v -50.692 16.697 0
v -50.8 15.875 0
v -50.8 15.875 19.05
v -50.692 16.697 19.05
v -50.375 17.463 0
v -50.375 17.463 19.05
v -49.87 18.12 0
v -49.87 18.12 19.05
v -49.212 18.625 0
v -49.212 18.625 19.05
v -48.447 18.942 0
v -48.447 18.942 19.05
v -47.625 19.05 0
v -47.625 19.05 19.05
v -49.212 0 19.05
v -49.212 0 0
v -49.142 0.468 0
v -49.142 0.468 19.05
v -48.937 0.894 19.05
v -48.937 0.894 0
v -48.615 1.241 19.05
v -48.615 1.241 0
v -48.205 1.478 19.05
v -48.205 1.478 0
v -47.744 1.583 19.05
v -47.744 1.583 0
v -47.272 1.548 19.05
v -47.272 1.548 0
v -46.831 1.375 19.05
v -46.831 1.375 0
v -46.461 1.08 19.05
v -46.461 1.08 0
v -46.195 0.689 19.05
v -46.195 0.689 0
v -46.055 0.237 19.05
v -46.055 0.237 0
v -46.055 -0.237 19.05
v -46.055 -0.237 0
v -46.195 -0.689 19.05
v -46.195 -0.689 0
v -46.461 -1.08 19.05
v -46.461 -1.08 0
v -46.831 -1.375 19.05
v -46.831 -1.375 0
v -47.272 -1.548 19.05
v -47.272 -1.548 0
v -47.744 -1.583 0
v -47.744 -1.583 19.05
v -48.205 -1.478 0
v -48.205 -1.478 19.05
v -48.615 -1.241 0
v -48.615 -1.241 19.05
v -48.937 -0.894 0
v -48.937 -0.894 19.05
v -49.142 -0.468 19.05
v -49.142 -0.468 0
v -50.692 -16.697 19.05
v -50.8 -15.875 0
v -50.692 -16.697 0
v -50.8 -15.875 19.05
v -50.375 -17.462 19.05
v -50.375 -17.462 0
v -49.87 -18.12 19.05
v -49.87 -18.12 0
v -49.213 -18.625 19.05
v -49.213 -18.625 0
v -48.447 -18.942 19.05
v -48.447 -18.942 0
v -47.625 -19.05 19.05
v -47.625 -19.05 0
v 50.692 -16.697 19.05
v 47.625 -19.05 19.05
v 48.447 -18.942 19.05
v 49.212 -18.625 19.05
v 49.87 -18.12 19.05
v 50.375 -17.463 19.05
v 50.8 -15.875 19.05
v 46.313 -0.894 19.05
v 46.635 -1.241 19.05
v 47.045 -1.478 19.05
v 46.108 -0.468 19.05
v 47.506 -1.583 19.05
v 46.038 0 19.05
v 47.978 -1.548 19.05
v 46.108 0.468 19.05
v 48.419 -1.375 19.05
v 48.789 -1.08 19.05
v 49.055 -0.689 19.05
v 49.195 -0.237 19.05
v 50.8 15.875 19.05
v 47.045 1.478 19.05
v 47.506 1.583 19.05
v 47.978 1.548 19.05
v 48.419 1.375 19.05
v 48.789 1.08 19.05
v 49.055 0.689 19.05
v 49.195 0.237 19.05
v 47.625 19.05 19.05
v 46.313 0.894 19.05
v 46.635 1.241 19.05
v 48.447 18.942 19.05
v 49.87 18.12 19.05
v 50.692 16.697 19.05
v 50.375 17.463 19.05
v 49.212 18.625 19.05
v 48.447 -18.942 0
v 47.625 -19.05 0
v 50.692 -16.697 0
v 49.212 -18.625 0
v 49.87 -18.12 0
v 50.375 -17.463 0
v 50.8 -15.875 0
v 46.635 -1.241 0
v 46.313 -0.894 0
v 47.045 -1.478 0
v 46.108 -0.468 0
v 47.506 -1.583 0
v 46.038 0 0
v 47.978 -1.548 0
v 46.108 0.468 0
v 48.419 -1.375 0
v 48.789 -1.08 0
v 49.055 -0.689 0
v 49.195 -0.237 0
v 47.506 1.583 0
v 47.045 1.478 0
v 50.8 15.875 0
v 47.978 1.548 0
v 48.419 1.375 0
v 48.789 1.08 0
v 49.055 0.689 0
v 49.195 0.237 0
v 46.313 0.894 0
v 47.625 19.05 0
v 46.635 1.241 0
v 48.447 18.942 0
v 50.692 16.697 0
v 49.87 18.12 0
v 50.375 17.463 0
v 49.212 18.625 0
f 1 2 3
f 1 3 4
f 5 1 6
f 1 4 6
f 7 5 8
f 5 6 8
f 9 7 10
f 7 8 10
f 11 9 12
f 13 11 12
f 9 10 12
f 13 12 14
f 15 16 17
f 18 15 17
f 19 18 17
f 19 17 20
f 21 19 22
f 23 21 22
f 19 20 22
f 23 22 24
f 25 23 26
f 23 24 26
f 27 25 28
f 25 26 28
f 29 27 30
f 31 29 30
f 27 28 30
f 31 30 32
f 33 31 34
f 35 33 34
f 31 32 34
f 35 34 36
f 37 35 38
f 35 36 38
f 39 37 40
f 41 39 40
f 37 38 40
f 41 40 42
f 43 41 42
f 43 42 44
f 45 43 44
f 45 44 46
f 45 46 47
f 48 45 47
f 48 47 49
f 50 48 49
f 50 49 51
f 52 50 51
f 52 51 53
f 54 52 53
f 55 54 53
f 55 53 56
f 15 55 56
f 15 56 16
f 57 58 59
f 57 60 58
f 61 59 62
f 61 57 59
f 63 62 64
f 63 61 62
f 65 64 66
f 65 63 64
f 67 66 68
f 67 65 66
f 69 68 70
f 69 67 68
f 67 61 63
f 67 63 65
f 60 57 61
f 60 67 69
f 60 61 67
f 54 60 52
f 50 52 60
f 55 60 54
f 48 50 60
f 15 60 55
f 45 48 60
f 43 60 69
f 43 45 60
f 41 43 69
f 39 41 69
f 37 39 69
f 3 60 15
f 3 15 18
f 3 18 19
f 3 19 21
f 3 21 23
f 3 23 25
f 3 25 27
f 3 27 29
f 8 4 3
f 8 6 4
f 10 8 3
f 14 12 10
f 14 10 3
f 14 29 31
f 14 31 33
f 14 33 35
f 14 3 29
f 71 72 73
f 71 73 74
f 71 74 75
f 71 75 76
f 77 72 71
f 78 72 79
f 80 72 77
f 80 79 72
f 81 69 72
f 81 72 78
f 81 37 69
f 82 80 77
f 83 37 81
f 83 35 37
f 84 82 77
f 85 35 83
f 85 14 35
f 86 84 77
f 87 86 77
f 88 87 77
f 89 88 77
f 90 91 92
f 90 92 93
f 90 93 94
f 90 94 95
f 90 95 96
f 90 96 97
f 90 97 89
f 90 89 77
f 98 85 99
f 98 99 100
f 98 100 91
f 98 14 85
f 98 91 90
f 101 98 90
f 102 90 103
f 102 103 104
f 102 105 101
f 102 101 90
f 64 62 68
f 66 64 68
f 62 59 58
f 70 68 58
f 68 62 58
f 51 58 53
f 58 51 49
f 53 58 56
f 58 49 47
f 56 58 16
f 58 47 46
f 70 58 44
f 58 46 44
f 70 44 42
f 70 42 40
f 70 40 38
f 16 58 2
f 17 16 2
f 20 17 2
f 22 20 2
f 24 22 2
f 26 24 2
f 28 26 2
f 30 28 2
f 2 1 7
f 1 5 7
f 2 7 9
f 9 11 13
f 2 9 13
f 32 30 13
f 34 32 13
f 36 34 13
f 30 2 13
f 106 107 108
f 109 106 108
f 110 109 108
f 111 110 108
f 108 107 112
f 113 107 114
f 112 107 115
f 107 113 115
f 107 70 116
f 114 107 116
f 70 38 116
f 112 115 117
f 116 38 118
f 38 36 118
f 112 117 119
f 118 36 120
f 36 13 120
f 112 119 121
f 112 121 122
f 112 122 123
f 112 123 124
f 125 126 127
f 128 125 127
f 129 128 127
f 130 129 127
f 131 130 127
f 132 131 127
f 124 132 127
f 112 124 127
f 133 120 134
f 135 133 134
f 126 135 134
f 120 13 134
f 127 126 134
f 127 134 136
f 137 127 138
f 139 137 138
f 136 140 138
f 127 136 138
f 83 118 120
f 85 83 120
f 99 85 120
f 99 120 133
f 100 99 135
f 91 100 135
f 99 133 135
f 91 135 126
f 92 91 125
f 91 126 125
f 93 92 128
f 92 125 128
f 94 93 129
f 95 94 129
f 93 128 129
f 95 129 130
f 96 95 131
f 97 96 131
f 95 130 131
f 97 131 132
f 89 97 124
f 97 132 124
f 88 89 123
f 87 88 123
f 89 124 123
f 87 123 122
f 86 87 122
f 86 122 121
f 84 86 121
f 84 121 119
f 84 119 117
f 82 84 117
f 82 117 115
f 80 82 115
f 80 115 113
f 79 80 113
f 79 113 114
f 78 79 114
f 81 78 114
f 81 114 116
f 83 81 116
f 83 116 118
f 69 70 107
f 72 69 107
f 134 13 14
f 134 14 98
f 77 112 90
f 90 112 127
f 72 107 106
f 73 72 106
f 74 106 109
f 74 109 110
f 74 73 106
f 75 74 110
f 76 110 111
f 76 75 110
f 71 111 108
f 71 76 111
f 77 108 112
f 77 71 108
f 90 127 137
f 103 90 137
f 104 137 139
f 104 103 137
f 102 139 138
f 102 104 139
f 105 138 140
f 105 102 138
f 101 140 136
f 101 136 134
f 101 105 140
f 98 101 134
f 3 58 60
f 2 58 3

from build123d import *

# Parameters (mm, degrees)
F0_W     = 101.6
F0_H     = 38.1
F1_DEPTH = 19.05
F2_R     = 3.175
F4_D     = 3.175


with BuildPart() as f1:
    # F0 (on Top) → F1 (new body)
    with BuildSketch(Plane.XY):
        Rectangle(F0_W, F0_H)
    extrude(amount=F1_DEPTH)

    # F2
    f2_edges = [f1.edges().sort_by_distance(p)[0] for p in [
        (-50.8, 19.05, 9.525),
        (-50.8, -19.05, 9.525),
        (50.8, 19.05, 9.525),
        (50.8, -19.05, 9.525),
    ]]
    fillet(f2_edges, radius=F2_R)

    # F4 (through all)
    with Locations(Plane.XY.offset(19.05)):
        with Locations((-47.625, 0), (47.625, 0)):
            Hole(F4_D / 2)


solid = f1.part
